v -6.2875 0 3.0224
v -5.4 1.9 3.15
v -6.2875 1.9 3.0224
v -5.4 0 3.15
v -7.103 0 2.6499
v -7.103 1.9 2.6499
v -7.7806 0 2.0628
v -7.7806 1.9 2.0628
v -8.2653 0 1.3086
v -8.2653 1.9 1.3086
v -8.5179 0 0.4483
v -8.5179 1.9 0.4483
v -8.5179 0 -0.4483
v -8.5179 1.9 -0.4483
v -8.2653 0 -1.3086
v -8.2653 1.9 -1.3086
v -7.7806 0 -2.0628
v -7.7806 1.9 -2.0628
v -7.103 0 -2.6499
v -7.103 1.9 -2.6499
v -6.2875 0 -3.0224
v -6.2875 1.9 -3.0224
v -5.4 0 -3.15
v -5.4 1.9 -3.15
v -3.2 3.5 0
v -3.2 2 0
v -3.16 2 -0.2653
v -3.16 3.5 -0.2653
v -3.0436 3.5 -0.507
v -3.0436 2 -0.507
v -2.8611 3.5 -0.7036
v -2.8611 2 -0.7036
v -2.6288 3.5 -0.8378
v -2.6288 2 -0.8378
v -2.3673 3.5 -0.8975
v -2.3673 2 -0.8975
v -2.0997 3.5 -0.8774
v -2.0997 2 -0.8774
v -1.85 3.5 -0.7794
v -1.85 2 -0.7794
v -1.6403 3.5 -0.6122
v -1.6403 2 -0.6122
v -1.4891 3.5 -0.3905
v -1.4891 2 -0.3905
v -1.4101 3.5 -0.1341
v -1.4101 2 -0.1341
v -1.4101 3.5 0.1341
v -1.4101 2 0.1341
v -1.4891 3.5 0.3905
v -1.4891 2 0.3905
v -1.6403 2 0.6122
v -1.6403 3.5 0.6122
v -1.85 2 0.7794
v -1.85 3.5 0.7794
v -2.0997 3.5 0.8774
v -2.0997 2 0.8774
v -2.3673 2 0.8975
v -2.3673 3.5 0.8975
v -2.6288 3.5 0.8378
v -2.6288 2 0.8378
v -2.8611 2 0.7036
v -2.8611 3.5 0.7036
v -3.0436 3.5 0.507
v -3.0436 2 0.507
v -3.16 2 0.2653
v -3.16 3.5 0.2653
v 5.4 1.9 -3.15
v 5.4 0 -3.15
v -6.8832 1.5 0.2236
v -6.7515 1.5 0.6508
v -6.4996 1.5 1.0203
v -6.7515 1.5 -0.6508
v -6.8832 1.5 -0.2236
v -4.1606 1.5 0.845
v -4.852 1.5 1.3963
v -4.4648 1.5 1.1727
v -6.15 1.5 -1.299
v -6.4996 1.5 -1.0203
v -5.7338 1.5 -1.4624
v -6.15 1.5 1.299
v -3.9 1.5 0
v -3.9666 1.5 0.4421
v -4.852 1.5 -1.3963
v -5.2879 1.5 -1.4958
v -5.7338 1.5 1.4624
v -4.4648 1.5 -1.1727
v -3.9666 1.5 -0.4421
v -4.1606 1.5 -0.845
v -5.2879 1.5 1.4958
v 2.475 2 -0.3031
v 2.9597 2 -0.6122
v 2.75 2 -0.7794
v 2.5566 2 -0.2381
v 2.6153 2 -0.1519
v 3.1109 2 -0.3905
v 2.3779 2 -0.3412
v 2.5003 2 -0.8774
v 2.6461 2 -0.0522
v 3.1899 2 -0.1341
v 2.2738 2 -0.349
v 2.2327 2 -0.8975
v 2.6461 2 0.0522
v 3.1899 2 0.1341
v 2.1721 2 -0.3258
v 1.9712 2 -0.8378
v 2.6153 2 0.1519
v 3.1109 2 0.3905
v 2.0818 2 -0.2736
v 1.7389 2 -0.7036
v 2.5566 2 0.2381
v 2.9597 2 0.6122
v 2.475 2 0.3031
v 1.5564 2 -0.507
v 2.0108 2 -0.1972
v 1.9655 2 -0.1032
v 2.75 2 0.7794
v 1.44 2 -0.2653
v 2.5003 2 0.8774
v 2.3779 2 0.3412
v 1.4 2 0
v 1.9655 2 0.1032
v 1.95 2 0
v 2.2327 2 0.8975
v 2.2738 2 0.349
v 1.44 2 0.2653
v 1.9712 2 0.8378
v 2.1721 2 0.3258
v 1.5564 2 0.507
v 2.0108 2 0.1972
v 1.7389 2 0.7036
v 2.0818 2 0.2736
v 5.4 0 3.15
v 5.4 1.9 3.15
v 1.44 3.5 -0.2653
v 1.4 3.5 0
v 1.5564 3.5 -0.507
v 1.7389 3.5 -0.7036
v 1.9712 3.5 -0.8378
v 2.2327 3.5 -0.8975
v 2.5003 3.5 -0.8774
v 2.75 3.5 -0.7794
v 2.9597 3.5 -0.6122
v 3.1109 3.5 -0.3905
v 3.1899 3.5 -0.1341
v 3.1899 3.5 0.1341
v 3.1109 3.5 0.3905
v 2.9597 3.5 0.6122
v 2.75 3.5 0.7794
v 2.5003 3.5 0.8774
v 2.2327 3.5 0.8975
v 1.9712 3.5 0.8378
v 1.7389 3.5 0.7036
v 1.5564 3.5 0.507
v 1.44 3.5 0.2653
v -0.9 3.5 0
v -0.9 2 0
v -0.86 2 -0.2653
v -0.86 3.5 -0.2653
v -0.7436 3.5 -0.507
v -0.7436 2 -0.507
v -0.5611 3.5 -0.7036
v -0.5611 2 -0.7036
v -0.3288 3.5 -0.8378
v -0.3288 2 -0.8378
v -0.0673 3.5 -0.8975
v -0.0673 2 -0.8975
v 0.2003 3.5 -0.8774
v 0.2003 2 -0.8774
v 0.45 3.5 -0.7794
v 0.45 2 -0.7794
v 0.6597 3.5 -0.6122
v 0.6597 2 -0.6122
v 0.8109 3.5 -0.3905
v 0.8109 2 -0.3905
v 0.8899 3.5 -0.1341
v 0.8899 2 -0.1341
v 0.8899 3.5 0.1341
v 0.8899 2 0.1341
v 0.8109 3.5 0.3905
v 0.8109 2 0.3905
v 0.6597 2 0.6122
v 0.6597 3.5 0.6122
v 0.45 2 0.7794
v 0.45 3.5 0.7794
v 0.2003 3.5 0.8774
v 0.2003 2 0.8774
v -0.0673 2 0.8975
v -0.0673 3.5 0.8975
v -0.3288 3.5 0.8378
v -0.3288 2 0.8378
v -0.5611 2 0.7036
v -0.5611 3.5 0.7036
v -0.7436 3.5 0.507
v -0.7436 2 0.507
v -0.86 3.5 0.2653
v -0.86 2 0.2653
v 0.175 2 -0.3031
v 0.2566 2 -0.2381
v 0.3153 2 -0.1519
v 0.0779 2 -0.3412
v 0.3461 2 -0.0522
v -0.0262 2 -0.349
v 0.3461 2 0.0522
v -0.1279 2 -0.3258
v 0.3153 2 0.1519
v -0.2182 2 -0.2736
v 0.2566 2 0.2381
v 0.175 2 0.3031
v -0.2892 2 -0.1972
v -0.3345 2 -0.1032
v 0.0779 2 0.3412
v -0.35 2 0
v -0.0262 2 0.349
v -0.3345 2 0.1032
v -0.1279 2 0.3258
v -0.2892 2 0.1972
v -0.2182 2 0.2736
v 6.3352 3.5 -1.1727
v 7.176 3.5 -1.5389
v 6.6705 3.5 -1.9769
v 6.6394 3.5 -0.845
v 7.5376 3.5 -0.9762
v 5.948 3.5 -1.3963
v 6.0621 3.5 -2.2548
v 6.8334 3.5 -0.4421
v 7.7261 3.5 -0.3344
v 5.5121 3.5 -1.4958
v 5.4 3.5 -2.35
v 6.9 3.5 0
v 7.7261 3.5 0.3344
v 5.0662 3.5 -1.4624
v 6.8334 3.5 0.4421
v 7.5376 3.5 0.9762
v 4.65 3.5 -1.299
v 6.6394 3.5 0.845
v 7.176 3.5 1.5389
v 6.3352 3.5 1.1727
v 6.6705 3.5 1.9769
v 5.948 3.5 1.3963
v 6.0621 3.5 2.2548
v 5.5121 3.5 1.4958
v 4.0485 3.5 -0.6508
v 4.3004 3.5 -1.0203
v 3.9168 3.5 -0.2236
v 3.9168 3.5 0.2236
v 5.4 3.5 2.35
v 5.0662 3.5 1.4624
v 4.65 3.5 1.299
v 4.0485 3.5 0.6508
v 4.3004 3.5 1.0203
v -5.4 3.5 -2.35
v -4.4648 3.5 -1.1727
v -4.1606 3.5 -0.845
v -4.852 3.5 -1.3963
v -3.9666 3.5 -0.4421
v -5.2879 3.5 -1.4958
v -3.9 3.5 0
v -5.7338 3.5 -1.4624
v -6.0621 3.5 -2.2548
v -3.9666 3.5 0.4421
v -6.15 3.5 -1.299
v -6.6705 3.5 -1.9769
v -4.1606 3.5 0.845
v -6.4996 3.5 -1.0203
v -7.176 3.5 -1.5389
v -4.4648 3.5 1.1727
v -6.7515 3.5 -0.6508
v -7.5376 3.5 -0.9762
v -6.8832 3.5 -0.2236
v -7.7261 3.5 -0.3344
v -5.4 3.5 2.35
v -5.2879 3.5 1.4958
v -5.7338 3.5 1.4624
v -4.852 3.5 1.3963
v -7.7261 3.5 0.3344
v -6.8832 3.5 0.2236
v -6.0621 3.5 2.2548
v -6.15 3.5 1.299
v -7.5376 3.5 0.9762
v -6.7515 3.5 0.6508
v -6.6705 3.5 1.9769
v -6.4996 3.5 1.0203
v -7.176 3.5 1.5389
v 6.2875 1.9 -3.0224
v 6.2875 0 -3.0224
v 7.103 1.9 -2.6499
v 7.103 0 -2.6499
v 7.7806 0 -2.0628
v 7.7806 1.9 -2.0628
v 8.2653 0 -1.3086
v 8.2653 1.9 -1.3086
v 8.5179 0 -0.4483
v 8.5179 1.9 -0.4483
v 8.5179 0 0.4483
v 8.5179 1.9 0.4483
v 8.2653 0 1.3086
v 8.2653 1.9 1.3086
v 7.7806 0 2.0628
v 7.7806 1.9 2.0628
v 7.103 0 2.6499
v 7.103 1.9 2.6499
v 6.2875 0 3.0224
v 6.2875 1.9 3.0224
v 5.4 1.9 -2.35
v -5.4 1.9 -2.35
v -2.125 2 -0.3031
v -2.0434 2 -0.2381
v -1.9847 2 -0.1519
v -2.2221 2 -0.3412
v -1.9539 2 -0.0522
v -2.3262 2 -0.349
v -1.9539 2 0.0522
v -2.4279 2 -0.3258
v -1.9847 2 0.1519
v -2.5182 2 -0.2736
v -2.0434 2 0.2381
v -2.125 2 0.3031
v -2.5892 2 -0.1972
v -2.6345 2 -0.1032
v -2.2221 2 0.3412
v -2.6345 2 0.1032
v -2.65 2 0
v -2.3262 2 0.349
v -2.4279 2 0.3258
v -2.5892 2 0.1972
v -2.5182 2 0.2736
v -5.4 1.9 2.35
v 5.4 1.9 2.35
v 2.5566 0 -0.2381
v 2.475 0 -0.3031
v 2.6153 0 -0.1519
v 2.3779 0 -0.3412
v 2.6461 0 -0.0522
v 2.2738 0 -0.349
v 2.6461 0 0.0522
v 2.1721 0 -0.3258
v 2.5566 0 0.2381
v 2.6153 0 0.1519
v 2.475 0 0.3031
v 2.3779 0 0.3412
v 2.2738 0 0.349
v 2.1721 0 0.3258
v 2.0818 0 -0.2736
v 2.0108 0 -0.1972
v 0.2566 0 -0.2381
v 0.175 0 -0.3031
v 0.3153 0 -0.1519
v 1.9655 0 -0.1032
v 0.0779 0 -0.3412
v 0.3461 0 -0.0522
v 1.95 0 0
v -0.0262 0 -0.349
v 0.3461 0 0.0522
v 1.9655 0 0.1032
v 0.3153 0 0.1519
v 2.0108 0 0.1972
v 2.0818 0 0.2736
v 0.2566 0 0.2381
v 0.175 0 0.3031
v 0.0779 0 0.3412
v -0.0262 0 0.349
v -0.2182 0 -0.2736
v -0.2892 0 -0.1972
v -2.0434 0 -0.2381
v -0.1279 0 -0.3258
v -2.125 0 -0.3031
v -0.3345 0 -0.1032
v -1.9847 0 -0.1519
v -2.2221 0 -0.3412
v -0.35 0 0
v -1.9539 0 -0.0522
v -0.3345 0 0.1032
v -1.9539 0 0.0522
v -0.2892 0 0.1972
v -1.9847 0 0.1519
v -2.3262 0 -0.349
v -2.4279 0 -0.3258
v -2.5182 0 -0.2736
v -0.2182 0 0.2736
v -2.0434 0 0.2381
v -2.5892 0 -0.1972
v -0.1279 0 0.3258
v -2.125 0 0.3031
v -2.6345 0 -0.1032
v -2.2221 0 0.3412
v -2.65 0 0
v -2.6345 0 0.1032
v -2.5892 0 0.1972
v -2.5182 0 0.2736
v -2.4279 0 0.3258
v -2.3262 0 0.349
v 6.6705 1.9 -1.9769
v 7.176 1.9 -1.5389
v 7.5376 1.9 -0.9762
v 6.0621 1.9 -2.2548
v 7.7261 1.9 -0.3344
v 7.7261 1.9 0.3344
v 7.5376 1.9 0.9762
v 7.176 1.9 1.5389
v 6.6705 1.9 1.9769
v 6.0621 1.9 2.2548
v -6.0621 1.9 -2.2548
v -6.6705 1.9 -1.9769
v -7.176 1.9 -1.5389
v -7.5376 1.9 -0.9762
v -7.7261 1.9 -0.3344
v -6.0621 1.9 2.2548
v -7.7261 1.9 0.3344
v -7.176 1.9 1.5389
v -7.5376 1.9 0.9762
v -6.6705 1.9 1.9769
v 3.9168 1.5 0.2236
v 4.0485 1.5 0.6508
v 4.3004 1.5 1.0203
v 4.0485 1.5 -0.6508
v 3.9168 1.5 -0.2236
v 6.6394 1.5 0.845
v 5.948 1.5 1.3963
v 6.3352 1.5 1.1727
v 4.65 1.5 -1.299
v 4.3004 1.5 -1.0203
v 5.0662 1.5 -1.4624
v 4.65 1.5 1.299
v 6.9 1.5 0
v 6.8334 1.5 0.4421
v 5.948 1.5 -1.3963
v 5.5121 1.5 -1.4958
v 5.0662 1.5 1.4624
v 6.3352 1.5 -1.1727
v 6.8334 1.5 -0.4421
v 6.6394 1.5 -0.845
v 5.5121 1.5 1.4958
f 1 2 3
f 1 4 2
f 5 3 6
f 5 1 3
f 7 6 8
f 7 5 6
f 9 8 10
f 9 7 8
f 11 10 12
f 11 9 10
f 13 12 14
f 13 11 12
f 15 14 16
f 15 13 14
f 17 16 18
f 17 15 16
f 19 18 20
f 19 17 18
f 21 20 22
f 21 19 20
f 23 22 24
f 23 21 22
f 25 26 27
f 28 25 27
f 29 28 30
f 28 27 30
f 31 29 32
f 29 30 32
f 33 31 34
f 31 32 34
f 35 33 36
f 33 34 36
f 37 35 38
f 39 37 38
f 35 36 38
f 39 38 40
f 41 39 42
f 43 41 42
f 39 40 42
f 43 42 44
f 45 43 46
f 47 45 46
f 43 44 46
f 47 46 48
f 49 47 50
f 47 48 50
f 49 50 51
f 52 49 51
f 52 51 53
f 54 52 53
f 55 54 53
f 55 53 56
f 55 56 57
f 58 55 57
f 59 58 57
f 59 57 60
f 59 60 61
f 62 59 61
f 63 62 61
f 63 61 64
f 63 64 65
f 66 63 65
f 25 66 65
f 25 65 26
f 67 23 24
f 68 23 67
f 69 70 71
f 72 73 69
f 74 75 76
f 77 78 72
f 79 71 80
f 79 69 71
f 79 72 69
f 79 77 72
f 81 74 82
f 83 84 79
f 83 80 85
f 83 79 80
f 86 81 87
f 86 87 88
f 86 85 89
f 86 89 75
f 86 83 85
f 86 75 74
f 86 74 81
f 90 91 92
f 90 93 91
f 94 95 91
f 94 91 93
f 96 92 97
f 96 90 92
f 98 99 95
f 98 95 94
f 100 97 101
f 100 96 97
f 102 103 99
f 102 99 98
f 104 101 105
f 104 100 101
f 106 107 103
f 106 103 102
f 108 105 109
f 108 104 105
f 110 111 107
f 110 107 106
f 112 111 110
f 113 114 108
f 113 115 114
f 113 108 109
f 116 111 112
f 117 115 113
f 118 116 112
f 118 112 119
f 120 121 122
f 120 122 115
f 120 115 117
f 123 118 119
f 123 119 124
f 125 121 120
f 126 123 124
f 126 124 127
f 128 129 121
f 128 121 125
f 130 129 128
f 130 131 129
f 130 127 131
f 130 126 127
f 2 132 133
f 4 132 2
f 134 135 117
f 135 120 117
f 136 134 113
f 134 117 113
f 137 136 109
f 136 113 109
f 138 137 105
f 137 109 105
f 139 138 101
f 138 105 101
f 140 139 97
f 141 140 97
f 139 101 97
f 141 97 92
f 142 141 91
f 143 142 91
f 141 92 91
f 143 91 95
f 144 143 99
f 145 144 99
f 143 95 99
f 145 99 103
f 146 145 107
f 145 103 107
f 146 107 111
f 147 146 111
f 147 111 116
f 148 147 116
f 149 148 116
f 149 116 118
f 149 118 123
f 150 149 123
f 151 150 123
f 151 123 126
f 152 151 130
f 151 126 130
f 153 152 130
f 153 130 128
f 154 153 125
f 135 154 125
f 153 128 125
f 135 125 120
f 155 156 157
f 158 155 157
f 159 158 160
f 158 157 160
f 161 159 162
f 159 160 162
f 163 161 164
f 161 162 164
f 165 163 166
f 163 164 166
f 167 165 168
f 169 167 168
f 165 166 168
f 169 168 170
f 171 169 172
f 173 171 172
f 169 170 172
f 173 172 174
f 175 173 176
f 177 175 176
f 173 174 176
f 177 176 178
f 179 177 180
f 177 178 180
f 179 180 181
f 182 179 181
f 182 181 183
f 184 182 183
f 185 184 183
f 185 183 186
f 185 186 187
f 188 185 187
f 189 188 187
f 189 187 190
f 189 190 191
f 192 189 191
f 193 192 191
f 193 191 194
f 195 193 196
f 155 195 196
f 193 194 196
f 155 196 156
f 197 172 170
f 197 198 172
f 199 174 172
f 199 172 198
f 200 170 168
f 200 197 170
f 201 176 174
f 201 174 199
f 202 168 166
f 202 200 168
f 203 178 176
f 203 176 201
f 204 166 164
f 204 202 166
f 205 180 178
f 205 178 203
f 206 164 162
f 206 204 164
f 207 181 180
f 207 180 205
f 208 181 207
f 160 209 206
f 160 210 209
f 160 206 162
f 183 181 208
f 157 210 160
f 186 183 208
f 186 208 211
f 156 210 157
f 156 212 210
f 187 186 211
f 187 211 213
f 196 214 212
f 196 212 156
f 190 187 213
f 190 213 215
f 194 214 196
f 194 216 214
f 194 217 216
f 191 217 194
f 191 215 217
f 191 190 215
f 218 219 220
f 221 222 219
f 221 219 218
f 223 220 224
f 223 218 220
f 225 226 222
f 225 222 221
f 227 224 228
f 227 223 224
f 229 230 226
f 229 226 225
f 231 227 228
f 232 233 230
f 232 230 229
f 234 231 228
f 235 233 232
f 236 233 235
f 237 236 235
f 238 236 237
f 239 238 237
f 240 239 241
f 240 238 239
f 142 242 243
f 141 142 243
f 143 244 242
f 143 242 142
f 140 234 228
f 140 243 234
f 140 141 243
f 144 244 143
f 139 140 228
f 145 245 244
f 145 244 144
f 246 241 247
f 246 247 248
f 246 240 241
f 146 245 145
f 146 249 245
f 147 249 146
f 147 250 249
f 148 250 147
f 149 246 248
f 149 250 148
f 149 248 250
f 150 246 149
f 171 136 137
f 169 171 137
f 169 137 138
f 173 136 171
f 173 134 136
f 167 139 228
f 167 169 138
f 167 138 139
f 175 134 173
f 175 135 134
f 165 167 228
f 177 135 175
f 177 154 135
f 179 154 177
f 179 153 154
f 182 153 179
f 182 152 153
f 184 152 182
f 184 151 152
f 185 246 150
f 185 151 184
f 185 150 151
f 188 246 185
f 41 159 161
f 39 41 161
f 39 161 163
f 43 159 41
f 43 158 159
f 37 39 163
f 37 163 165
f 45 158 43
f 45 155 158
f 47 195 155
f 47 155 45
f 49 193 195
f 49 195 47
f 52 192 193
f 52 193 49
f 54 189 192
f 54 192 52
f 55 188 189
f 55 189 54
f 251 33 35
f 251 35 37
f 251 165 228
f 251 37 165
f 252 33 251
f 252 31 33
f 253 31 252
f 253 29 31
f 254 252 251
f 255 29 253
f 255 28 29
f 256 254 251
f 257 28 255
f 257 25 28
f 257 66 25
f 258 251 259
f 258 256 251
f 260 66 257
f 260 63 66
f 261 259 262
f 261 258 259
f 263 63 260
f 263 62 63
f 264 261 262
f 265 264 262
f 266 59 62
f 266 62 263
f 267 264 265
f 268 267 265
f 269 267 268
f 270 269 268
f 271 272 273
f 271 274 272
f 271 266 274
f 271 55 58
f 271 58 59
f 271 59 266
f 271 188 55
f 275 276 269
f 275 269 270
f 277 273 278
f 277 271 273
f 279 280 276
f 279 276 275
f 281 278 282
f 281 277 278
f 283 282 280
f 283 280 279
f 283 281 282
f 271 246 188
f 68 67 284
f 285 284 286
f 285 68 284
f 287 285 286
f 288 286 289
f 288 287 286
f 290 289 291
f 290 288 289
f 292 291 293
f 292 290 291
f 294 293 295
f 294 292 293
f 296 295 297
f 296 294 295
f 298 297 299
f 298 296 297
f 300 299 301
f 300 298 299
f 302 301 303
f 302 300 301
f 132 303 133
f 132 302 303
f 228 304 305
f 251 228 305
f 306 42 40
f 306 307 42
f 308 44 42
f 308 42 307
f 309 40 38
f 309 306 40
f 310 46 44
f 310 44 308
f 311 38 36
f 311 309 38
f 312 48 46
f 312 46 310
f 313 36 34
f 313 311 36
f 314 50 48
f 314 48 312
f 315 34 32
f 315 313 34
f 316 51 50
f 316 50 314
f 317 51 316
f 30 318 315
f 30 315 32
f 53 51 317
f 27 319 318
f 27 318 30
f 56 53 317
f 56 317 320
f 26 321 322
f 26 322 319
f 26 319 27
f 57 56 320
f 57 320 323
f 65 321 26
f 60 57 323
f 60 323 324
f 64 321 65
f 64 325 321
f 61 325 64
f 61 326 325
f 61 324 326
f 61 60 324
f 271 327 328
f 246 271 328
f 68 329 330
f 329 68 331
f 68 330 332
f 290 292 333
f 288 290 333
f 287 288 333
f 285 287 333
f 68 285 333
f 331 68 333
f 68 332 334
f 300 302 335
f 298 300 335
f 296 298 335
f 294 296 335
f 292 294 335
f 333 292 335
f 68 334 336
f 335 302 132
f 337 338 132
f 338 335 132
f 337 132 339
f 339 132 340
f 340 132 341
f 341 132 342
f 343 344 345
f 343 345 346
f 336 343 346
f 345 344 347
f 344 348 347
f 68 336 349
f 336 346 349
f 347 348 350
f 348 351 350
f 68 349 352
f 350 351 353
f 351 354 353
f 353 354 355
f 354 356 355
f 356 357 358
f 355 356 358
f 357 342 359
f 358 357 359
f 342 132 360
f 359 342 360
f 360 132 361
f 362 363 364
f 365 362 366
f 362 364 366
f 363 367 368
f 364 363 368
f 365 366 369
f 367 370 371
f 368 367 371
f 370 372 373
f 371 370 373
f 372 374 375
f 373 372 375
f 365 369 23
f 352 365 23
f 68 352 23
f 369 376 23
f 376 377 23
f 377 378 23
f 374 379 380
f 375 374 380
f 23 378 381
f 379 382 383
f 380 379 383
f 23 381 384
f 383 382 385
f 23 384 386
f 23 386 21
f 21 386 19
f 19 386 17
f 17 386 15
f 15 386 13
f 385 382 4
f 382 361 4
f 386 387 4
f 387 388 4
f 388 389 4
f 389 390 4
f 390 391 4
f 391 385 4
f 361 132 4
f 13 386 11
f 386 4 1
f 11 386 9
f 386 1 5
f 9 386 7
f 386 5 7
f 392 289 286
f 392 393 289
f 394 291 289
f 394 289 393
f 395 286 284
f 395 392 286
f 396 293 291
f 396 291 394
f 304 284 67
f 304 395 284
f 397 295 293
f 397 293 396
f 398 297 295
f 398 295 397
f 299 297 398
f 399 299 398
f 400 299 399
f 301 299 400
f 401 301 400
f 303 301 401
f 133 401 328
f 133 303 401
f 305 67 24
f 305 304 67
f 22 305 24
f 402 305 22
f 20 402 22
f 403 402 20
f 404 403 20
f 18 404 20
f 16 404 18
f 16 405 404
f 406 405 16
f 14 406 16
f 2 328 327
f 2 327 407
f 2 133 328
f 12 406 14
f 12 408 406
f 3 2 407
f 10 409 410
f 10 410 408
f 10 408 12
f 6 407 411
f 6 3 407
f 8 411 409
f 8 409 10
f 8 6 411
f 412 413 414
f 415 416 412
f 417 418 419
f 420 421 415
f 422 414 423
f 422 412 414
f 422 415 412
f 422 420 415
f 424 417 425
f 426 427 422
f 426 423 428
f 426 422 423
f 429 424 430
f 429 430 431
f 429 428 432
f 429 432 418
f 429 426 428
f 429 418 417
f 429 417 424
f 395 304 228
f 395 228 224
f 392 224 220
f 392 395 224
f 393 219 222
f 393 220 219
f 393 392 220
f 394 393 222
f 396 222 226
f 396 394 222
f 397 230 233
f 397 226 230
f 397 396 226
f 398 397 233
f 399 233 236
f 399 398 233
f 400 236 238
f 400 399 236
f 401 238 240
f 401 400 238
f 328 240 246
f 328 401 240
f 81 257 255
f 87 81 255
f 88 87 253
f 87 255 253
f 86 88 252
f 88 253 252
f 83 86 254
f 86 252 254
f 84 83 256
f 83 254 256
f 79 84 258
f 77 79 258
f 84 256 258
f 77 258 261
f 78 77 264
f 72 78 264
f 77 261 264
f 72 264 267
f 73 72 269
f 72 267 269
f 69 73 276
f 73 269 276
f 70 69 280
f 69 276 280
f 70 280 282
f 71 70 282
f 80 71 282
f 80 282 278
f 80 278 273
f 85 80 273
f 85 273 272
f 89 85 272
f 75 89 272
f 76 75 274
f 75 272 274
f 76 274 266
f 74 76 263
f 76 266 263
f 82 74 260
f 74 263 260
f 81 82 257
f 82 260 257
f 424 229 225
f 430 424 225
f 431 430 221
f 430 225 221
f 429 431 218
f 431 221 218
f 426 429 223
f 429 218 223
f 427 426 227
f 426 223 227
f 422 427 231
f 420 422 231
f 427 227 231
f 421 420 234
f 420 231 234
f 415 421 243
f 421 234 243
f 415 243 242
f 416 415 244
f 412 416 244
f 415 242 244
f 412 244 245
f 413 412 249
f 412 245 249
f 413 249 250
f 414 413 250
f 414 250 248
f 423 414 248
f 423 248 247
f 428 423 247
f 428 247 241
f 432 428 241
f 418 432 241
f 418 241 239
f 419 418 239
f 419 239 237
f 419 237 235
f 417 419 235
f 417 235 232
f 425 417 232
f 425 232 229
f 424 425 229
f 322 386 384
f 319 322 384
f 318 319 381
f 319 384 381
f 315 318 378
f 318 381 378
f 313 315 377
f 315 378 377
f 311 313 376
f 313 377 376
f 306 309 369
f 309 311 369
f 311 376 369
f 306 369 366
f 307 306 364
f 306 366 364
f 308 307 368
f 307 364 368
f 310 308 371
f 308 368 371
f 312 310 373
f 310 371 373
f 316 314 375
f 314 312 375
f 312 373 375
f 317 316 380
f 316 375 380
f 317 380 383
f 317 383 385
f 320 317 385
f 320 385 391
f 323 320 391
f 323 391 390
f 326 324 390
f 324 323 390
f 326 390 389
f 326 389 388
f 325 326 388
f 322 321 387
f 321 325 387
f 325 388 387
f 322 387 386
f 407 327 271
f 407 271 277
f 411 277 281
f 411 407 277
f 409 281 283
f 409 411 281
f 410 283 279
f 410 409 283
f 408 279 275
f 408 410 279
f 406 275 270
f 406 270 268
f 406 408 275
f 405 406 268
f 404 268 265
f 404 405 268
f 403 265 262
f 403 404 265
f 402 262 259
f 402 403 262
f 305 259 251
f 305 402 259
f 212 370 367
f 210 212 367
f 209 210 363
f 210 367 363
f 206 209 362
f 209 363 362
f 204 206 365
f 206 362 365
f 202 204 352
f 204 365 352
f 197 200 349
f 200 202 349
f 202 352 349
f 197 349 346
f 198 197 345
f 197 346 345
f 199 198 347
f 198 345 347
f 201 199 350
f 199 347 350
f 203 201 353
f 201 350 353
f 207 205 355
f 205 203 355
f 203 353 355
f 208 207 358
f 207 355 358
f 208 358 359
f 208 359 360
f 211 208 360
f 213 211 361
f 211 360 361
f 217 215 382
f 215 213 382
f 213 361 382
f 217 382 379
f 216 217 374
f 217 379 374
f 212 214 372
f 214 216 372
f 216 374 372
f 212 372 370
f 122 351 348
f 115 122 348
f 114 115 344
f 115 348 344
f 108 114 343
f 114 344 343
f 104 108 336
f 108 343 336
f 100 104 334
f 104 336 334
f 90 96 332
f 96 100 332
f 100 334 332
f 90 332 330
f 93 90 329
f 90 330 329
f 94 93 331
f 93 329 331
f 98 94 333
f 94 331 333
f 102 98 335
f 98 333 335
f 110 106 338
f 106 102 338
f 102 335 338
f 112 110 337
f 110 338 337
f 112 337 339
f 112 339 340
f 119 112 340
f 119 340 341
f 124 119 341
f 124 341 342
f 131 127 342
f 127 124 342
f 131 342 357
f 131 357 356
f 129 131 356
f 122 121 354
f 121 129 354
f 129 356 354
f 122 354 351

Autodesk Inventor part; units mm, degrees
ref_plane "YZ Plane" through (0, 0, 0) normal (1, 0, 0) x (0, 1, 0)
ref_plane "XZ Plane" through (0, 0, 0) normal (0, 1, 0) x (-1, 0, 0)
sketch "Sketch2" plane through (0, 0, 0) normal (0, 1, 0) x (-1, 0, 0)
  line L0 (-13.1182, 6.5103) -> (18.7692, 6.5103) construction
  line L1 (18.7692, 6.5103) -> (18.7692, -12.5367) construction
  line L2 (18.7692, -12.5367) -> (-13.1182, -12.5367) construction
  line L3 (-13.1182, -12.5367) -> (-13.1182, 6.5103) construction
  line L4 (-5.4, 3.15) -> (5.4, 3.15)
  line L5 (8.55, 0) -> (8.55, 0)
  line L6 (5.4, -3.15) -> (-5.4, -3.15)
  line L7 (-8.55, 0) -> (-8.55, 0)
  line L8 (-8.55, 3.15) -> (8.55, -3.15) construction
  line L9 (8.55, 3.15) -> (-8.55, -3.15) construction
  arc A0 (8.55, 0) -> (5.4, 3.15) centre (5.4, 0) ccw
  arc A1 (5.4, -3.15) -> (8.55, 0) centre (5.4, 0) ccw
  arc A2 (-5.4, 3.15) -> (-8.55, 0) centre (-5.4, 0) ccw
  arc A3 (-8.55, 0) -> (-5.4, -3.15) centre (-5.4, 0) ccw
  line L10 (5.4, 2.35) -> (-5.4, 2.35)
  line L11 (-7.75, 0) -> (-7.75, 0)
  line L12 (-5.4, -2.35) -> (5.4, -2.35)
  line L13 (7.75, 0) -> (7.75, 0)
  line L14 (7.75, 2.35) -> (-7.75, -2.35) construction
  line L15 (-7.75, 2.35) -> (7.75, -2.35) construction
  arc A4 (-5.4, 2.35) -> (-7.75, 0) centre (-5.4, 0) ccw
  arc A5 (-7.75, 0) -> (-5.4, -2.35) centre (-5.4, 0) ccw
  arc A6 (7.75, 0) -> (5.4, 2.35) centre (5.4, 0) ccw
  arc A7 (5.4, -2.35) -> (7.75, 0) centre (5.4, 0) ccw
  circle A8 centre (5.4, 0) radius 1.5
  circle A9 centre (-5.4, 0) radius 1.5
  circle A10 centre (2.3, 0) radius 0.9
  circle A11 centre (0, 0) radius 0.9
  circle A12 centre (-2.3, 0) radius 0.9
  circle A13 centre (2.3, 0) radius 0.35
  circle A14 centre (0, 0) radius 0.35
  circle A15 centre (-2.3, 0) radius 0.35
  point P0 (-7.75, 0)
  point P1 (7.75, 0)
  point P2 (-8.55, 0)
  point P3 (8.55, 0)
  dimension "d61" = 17.1
  dimension "d62" = 6.3
  dimension "d88" = 3.15
  dimension "d90" = 0.8
  dimension "d91" = 0.8
  dimension "d92" = 2.35
  dimension "d93" = 3
  dimension "d94" = 3
  dimension "d97" = 1.8
  dimension "d98" = 1.8
  dimension "d99" = 1.8
  dimension "d100" = 4.6
  dimension "d115" = 0.7
  dimension "d116" = 0.7
  dimension "d117" = 0.7
  dimension "d133" = 4.7
extrude "Extrusion1" add sketch "Sketch2" along normal blind 3.5 contours A6 A7 L12 A5 A4 L10 | A8 | A9 | A10 | A11 | A12 | A13 | A14 | A15
extrude "Extrusion2" add sketch "Sketch2" along normal blind 1.9 contours L4 A0 A1 L6 A3 A2
extrude "Extrusion3" cut sketch "Sketch2" along normal through all contours A10 | A11 | A12 | A13 | A14 | A15
ref_plane "Work Plane1" through (0, -1.5, 0) normal (0, -1, 0) x (1, 0, 0)
extrude "Extrusion5" add sketch "Sketch2" along normal blind 2 contours A10 | A11 | A12
sketch "Sketch5" plane through (0, 3.5, 0) normal (0, 1, 0) x (1, 0, 0)
  line L0 (0, 0) -> (5.4, 0)
  circle A0 centre (5.4, 0) radius 1.5
  line L1 (0, 0) -> (-5.4, 0)
  circle A1 centre (-5.4, 0) radius 1.5
  dimension "d127" = 5.4
  dimension "d128" = 3
  dimension "d129" = 5.4
  dimension "d130" = 3
extrude "Extrusion7" cut sketch "Sketch5" against normal blind 2
properties part number "Pogo1" material "Nylon 6"
